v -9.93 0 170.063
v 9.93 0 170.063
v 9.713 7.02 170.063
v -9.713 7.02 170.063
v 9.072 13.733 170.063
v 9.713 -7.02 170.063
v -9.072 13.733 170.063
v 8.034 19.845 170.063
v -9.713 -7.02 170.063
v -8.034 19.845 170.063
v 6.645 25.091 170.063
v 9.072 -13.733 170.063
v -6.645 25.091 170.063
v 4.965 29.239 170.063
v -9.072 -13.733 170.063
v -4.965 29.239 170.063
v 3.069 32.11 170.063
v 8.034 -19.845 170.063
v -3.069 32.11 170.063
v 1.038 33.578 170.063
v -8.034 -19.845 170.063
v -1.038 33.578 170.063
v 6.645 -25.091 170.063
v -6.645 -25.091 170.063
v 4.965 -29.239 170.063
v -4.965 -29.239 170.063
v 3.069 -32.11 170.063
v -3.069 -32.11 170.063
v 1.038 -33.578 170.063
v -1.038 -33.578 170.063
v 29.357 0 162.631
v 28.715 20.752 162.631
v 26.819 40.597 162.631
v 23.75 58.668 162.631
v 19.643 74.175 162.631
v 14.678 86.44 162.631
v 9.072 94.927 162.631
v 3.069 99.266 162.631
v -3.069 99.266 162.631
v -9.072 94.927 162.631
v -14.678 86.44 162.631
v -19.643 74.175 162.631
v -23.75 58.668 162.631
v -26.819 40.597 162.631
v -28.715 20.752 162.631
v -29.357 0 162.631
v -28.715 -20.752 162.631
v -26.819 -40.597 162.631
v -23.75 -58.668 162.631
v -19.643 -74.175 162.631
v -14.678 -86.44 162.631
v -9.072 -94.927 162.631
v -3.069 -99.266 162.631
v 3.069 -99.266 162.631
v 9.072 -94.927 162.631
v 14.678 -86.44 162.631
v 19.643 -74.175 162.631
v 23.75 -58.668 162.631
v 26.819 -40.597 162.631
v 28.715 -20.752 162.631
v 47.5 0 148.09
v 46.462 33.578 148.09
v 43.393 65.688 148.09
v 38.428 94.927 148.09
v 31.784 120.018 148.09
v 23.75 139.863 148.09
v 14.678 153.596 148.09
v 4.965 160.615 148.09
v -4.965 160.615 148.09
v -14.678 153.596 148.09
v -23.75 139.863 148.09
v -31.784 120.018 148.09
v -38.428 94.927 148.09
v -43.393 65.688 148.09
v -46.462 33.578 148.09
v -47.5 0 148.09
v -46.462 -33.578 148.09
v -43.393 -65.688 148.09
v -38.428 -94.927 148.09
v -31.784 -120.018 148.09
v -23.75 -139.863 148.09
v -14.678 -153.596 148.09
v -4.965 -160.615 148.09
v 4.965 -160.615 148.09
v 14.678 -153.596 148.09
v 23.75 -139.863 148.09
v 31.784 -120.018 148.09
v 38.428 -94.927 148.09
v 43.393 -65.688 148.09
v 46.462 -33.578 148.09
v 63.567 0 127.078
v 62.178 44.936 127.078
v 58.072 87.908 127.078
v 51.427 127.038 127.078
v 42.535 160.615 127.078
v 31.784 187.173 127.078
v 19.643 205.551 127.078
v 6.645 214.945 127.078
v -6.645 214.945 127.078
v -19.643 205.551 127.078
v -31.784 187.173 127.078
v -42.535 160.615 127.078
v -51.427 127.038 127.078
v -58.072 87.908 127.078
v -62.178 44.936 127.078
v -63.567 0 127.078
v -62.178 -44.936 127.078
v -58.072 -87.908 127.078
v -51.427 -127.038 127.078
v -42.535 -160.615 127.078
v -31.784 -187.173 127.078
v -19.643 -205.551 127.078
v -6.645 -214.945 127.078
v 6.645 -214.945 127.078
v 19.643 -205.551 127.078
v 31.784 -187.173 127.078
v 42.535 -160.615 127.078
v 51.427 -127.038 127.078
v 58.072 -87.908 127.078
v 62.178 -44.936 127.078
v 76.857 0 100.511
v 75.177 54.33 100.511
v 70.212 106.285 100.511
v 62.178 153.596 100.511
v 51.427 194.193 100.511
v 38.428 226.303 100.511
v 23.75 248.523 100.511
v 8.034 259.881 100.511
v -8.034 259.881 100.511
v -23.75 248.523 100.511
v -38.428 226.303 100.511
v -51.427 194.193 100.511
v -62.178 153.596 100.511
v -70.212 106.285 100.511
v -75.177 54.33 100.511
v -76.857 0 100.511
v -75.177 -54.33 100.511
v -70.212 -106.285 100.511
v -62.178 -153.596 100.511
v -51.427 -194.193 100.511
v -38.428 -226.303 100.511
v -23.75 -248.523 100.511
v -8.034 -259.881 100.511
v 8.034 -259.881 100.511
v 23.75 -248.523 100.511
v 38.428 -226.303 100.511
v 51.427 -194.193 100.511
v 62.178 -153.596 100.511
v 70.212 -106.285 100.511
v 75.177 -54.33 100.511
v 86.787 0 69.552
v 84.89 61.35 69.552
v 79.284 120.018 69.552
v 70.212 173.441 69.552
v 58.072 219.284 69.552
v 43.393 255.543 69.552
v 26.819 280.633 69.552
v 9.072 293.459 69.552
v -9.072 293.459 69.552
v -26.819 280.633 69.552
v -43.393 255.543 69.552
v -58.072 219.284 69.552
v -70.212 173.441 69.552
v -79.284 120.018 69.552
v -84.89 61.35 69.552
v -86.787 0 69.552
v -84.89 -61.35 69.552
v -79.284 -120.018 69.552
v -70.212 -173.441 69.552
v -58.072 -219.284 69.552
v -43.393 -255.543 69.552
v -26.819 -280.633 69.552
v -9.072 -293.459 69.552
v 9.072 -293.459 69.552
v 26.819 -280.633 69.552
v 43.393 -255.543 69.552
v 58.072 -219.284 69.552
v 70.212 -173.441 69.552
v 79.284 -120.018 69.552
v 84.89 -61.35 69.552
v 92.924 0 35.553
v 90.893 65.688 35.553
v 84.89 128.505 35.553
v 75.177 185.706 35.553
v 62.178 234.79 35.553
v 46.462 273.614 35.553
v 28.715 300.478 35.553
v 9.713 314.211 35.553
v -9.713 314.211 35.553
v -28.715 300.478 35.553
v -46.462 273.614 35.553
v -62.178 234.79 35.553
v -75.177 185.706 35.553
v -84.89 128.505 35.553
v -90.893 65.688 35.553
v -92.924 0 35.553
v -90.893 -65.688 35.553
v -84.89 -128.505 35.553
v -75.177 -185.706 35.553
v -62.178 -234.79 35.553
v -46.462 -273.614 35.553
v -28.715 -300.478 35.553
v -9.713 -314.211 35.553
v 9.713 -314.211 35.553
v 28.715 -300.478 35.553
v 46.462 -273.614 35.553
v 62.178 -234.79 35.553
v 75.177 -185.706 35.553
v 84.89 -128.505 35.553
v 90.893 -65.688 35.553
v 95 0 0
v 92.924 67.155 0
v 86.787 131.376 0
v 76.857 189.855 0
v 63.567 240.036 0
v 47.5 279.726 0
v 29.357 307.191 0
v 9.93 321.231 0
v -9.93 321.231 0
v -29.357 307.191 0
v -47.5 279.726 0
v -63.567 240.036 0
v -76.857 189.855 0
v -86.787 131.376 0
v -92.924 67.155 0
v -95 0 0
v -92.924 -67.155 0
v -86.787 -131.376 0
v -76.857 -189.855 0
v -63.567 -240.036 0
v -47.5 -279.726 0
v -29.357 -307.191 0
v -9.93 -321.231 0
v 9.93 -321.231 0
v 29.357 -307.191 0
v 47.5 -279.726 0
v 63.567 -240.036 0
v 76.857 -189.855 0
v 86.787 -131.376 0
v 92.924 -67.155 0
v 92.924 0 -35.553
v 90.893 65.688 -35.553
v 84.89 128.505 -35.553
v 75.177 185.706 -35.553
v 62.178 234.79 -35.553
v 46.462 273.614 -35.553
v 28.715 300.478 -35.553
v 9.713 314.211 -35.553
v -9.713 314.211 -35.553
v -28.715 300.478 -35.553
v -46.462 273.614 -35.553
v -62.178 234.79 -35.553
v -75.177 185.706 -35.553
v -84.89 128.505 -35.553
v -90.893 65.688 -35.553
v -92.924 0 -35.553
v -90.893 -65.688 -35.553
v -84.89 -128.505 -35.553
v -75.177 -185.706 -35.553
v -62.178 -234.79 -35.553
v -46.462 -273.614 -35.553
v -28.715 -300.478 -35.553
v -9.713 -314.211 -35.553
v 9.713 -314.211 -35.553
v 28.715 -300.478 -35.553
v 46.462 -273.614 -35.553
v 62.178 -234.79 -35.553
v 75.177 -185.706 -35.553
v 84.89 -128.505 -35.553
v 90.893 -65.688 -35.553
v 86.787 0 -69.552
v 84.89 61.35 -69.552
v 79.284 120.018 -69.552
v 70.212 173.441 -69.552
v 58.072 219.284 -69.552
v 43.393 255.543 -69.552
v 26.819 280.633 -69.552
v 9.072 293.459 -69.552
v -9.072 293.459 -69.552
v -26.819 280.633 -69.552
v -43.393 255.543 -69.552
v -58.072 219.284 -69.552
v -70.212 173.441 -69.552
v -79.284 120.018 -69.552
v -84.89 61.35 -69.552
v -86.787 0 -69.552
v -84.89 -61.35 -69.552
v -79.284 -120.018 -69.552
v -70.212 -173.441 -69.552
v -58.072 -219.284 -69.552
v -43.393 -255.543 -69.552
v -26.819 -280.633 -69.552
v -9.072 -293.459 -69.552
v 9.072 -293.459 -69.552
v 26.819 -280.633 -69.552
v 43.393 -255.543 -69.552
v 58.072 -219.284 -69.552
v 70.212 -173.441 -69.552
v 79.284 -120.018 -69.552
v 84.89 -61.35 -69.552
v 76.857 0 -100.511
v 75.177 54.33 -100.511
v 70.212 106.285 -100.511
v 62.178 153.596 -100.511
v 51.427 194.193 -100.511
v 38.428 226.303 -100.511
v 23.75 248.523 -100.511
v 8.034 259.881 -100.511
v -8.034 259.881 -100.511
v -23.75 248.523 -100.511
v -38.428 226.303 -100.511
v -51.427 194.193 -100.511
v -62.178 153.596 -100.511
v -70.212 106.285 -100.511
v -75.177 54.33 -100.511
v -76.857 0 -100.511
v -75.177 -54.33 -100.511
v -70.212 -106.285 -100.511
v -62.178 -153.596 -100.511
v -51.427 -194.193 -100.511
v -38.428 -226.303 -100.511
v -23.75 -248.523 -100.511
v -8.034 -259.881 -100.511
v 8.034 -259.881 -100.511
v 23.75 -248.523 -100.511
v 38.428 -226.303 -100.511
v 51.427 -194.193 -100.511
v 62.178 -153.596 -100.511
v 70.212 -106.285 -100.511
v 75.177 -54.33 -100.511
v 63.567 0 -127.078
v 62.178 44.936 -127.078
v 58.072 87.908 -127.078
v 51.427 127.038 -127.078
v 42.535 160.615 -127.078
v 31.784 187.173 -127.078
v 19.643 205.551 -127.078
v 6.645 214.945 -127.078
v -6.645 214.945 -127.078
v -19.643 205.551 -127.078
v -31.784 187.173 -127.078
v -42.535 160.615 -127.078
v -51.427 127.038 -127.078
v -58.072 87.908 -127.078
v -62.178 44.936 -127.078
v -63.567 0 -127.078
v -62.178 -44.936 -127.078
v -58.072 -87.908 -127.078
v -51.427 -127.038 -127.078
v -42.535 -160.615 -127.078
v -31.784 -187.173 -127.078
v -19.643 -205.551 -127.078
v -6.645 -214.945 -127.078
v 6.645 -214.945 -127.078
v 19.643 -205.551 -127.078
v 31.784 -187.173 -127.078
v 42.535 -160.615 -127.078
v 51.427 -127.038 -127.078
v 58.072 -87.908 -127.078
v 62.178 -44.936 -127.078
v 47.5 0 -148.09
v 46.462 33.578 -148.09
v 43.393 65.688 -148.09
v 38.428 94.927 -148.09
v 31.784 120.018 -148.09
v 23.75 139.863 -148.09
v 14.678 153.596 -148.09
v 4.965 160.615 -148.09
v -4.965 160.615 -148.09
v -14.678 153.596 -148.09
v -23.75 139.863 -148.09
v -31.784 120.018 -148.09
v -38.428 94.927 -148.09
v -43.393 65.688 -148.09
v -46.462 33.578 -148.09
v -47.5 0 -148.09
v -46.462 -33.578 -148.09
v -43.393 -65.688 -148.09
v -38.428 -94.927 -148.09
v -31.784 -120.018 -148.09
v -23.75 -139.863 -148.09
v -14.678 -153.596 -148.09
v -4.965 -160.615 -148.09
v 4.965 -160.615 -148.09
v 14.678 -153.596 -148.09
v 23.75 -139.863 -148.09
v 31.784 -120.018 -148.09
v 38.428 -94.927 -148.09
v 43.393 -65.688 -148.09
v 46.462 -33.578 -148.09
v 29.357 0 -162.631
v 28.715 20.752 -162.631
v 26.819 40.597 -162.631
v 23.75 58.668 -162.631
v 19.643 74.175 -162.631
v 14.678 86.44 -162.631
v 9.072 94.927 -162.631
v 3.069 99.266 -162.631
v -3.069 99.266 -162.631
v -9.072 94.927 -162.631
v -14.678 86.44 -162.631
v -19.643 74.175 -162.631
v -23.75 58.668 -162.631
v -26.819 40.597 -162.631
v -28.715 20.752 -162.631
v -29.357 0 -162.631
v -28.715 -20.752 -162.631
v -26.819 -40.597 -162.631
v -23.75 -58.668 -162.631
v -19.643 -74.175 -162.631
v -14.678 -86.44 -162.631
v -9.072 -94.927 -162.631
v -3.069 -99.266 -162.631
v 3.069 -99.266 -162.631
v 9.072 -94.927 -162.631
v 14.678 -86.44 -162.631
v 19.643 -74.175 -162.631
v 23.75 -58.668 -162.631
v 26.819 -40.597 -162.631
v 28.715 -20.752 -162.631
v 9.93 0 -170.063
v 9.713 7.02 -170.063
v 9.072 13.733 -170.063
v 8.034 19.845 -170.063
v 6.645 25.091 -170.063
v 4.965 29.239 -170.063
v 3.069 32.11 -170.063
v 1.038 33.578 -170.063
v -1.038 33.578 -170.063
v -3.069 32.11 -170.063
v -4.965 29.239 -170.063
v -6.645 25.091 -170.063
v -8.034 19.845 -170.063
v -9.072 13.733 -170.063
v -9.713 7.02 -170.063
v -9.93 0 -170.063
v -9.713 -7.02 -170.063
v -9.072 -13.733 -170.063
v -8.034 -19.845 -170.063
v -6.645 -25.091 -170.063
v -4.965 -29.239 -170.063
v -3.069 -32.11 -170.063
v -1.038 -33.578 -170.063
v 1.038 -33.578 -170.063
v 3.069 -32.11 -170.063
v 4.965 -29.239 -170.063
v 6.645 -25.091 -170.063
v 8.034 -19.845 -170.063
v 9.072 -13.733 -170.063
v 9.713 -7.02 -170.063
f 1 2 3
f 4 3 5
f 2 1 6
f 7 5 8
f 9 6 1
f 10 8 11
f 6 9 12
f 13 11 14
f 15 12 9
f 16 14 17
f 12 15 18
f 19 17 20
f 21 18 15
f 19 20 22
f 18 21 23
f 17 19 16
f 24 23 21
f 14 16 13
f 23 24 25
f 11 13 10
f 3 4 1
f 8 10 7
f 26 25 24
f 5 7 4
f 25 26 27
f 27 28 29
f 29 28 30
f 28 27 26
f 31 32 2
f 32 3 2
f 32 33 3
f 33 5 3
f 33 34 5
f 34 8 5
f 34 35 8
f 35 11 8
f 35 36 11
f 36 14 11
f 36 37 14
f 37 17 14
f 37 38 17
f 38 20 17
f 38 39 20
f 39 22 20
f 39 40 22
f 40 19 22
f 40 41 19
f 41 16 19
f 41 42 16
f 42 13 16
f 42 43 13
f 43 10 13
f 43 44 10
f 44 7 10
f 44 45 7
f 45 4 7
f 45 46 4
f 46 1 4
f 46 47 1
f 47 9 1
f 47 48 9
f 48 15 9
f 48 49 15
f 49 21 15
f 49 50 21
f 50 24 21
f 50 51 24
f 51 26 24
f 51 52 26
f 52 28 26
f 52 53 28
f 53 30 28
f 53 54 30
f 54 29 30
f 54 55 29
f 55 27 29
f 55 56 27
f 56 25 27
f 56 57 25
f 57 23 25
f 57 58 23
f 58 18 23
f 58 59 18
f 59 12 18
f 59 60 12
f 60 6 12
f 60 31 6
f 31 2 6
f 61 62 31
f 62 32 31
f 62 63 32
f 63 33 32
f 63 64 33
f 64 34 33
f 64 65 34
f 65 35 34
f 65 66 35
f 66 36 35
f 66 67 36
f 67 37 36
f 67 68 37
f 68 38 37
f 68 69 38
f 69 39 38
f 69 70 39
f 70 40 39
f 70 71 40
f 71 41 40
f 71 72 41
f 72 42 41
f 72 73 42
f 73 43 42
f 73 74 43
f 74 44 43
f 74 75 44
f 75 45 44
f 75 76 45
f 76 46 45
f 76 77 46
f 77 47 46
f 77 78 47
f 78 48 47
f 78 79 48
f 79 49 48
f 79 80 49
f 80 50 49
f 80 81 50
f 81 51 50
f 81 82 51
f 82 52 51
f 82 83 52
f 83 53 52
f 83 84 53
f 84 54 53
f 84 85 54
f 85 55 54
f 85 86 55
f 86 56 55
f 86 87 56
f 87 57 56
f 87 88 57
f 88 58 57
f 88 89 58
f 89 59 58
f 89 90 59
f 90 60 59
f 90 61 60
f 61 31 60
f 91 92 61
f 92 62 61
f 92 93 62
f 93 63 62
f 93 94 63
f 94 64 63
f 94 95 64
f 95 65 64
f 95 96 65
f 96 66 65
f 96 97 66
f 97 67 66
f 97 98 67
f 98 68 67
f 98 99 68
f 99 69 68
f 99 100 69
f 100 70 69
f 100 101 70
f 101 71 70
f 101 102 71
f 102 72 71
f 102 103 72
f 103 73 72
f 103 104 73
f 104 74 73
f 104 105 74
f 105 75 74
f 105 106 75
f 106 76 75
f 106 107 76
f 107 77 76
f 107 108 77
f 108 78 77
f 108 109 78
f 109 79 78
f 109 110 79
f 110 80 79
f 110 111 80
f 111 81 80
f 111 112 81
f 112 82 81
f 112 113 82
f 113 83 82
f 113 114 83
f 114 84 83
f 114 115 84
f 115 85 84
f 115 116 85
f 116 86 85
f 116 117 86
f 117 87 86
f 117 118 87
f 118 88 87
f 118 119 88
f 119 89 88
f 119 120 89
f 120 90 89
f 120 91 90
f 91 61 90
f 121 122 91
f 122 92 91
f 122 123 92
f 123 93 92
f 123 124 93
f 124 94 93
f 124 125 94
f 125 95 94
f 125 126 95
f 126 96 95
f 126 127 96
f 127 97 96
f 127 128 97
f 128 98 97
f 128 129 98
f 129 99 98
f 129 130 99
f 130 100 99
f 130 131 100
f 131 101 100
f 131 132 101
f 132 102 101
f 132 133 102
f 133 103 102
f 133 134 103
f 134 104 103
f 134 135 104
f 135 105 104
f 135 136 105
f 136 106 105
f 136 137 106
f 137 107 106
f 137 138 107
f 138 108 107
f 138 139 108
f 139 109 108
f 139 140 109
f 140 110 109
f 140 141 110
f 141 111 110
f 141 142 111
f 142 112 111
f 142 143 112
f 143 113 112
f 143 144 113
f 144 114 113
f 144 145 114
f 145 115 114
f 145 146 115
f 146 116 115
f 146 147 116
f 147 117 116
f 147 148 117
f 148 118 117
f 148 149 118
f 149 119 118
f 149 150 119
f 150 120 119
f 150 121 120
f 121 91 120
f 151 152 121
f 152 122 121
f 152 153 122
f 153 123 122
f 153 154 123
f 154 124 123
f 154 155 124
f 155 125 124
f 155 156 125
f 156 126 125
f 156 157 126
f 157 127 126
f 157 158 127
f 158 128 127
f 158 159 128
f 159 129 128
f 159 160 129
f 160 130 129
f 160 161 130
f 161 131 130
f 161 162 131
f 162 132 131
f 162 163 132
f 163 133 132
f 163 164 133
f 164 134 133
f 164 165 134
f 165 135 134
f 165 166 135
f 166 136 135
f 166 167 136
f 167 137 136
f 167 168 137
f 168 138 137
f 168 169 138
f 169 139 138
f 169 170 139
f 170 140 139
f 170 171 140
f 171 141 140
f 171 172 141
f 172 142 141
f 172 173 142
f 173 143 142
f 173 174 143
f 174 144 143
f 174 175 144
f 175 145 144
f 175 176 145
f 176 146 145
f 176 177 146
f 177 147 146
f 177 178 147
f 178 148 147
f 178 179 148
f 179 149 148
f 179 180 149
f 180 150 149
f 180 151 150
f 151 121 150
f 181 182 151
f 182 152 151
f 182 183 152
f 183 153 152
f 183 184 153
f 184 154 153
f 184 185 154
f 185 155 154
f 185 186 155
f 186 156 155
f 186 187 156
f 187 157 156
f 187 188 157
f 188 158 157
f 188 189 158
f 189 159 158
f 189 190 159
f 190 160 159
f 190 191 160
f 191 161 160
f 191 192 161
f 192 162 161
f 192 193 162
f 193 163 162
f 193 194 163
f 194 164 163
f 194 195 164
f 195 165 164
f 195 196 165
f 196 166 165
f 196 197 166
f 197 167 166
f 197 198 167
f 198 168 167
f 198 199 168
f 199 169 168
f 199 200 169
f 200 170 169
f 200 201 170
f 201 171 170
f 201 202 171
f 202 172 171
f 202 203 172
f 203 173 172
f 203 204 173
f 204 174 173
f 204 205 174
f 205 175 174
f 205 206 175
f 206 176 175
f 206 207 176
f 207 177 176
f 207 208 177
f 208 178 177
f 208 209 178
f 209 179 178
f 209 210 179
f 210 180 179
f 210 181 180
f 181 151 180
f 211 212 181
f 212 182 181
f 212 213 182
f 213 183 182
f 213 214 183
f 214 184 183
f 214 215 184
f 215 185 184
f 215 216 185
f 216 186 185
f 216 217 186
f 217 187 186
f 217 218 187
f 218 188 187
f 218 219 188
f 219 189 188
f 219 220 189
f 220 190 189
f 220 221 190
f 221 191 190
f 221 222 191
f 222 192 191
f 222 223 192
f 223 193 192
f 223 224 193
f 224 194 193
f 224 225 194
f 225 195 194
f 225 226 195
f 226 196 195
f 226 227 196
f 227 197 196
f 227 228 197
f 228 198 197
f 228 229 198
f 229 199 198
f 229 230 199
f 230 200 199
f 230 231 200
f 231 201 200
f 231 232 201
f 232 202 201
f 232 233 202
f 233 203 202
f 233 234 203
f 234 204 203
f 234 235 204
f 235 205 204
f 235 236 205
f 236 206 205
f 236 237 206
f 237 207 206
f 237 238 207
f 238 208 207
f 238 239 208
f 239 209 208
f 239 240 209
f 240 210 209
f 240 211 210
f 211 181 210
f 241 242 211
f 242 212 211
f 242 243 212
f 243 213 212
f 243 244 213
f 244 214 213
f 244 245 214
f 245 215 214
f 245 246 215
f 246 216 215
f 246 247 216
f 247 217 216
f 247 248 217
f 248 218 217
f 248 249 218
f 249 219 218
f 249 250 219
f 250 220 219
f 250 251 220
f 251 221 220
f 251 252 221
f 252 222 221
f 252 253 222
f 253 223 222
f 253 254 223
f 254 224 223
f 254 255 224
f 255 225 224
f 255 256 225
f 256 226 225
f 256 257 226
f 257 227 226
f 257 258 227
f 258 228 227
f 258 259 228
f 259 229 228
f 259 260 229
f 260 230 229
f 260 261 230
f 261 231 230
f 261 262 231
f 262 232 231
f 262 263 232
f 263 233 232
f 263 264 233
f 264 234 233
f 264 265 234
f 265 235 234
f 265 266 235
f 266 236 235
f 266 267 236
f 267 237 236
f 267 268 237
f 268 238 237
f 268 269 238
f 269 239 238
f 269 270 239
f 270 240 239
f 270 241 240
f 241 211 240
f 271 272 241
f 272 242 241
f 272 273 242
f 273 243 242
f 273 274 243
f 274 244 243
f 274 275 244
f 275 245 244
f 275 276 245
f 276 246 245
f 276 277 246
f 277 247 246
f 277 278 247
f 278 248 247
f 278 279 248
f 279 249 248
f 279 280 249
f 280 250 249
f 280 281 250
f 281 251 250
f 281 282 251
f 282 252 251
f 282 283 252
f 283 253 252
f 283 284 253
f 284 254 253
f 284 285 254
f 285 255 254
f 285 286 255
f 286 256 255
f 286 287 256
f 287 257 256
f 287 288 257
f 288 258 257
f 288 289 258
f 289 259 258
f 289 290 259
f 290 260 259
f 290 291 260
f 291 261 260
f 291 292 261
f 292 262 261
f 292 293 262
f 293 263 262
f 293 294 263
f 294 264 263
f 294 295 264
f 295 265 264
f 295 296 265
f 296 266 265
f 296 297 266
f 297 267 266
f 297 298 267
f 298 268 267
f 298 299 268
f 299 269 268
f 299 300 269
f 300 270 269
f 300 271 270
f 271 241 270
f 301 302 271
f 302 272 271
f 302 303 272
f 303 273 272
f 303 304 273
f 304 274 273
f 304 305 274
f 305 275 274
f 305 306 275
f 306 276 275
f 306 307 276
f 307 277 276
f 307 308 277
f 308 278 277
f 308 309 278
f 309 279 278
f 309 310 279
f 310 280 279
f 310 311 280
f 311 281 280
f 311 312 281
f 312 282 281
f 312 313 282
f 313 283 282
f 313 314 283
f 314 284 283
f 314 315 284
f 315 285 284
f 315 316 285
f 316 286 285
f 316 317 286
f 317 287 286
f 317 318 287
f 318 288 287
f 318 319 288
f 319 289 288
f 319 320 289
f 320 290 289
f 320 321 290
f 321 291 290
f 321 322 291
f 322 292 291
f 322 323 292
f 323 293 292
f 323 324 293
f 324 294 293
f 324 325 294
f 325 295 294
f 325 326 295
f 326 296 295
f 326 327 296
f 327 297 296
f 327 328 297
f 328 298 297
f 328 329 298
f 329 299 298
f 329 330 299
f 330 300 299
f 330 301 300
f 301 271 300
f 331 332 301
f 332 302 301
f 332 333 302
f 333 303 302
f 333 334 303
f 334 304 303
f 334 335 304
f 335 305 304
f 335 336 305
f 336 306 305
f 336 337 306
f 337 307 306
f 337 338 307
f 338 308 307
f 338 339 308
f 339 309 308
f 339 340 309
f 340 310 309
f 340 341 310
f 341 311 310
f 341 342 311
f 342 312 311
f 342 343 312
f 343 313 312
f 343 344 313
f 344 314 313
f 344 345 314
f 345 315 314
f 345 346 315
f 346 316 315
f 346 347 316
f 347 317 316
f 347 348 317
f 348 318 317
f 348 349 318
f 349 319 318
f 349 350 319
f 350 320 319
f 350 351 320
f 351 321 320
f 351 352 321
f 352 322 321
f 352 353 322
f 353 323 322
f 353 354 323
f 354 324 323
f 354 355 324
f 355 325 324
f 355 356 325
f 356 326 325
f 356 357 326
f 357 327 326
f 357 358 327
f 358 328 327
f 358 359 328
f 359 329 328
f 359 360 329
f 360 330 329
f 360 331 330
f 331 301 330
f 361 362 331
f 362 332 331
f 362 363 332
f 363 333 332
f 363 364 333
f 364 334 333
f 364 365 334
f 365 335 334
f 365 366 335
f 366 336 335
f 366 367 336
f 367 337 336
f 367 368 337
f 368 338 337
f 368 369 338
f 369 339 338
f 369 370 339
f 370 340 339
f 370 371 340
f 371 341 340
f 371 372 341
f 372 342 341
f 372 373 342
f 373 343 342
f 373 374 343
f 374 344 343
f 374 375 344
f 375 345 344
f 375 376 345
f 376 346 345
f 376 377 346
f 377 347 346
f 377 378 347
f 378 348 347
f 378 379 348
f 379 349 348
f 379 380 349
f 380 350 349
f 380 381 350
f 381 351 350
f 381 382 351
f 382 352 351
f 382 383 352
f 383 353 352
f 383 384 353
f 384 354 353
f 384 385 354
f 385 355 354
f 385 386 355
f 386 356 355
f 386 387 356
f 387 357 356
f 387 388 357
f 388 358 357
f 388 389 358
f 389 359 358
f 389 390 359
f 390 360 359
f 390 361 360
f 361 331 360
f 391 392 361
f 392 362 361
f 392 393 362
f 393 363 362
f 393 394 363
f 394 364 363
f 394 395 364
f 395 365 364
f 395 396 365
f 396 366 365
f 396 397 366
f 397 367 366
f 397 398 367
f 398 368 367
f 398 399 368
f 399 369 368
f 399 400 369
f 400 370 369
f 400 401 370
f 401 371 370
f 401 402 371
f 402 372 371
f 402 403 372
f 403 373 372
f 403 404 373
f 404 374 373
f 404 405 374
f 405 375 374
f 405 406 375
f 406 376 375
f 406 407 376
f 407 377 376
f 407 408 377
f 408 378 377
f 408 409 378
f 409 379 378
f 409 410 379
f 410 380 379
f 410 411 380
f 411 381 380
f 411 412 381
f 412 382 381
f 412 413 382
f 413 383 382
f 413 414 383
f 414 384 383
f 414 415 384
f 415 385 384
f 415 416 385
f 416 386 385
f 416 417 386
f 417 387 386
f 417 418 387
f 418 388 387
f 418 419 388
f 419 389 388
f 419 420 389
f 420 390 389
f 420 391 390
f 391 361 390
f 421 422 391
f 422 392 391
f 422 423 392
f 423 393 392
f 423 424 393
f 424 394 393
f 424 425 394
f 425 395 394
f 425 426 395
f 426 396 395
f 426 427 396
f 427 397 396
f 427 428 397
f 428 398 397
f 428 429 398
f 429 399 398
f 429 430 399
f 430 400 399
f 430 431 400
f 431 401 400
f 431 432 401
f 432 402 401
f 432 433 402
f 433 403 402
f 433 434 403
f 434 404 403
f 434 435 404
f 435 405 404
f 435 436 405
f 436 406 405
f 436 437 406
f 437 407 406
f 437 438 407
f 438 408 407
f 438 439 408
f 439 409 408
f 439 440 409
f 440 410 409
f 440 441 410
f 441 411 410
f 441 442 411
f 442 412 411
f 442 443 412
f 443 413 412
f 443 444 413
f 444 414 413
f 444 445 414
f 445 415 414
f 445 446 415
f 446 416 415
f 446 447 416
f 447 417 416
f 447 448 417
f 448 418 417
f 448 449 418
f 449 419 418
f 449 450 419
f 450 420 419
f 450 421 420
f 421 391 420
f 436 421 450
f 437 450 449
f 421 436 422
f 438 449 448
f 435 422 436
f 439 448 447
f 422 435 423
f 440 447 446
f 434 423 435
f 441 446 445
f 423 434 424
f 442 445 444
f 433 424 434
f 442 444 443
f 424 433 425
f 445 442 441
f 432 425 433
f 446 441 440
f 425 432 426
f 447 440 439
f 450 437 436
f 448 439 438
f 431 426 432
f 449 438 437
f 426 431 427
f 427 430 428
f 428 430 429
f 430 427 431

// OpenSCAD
// Generated by SolidPython 1.0.1 on 2020-07-29 00:46:46


scale(v = [5, 17, 9]) {
	sphere(r = 19);
}
/***********************************************
*********      SolidPython code:      **********
************************************************
 
# import packages: SolidPython
from solid import *
from solid.utils import *
from itertools import chain, combinations, permutations


class Resize:

    def __init__(self, scad_file):
        self.scad_file = scad_file
        #self.scad_file = import_scad(scad_file)
        # cone/cylinder param:
        self.r1 = 0
        self.r2 = 0
        self.h = 0
        # rectangular prism param:
        self.w = 0
        self.l = 0
        # ellipse param:
        self.r = 0

    # import OpenScad code (file name corresponds to shape)


    # classify shape + parameters
    def assign(self, param1, param2, param3):
        if self.scad_file == 'cone.scad':
            self.r1 = param1
            self.r2 = param2
            self.h = param3
        elif self.scad_file == 'cylinder.scad':
            self.r1 = param1
            self.r2 = param2
            self.h = param3
        elif self.scad_file == 'rectangularPrism.scad':
            self.h = param1
            self.l = param2
            self.w = param3
        else:
            self.r = param1
            self.h = param2

    # resize parameters
    def iterate(self):
        x = range(3, 20, 2)
        i = 1
        if self.scad_file == 'cone.scad':
            tempList = list(permutations(x, 2))
            for temp in tempList:
                param1 = temp[0]
                param2 = temp[1]
                filepath = 'produced_scad_files/' + 'cone' + str(param1) + '_' + str(param2) + '_' + '.scad'
                scad_render_to_file(cylinder(h=param1, r1=param2, r2=0), filepath)

        elif self.scad_file == 'cylinder.scad':
            tempList = list(permutations(x, 3))
            for temp in tempList:
                param1 = temp[0]
                param2 = temp[1]
                filepath = 'produced_scad_files/' + 'cylinder' + str(param1) + '_' + str(param2) + '_' + '.scad'
                scad_render_to_file(cylinder(h=param1, r1=param2, r2=param2), filepath)

        elif self.scad_file == 'rectangularPrism.scad':
            tempList = list(permutations(x, 3))
            for temp in tempList:
                param1 = temp[0]
                param2 = temp[1]
                param3 = temp[2]
                filepath = 'produced_scad_files/' + 'rectangularPrism' + str(param1) + '_' + str(param2) + '_' + str(
                    param3) + '.scad'
                scad_render_to_file(cube(size=(param1, param2, param3)), filepath)

        elif self.scad_file == 'ellipse.scad':
            tempList = list(permutations(x, 4))
            for temp in tempList:
                param1 = temp[0]
                param2 = temp[1]
                param3 = temp[2]
                param4 = temp[3]
                filepath = 'produced_scad_files/' + 'ellipse' + str(param1) + '_' + str(param2) + '_' + str(param3) + '_' + str(param4) + '.scad'
                scad_render_to_file(scale([param1, param2, param3])(sphere(r=param4)), filepath)

    def render_to_scadfile(self):
        scad_render_to_file(scad, 'example.scad') 
 
************************************************/
